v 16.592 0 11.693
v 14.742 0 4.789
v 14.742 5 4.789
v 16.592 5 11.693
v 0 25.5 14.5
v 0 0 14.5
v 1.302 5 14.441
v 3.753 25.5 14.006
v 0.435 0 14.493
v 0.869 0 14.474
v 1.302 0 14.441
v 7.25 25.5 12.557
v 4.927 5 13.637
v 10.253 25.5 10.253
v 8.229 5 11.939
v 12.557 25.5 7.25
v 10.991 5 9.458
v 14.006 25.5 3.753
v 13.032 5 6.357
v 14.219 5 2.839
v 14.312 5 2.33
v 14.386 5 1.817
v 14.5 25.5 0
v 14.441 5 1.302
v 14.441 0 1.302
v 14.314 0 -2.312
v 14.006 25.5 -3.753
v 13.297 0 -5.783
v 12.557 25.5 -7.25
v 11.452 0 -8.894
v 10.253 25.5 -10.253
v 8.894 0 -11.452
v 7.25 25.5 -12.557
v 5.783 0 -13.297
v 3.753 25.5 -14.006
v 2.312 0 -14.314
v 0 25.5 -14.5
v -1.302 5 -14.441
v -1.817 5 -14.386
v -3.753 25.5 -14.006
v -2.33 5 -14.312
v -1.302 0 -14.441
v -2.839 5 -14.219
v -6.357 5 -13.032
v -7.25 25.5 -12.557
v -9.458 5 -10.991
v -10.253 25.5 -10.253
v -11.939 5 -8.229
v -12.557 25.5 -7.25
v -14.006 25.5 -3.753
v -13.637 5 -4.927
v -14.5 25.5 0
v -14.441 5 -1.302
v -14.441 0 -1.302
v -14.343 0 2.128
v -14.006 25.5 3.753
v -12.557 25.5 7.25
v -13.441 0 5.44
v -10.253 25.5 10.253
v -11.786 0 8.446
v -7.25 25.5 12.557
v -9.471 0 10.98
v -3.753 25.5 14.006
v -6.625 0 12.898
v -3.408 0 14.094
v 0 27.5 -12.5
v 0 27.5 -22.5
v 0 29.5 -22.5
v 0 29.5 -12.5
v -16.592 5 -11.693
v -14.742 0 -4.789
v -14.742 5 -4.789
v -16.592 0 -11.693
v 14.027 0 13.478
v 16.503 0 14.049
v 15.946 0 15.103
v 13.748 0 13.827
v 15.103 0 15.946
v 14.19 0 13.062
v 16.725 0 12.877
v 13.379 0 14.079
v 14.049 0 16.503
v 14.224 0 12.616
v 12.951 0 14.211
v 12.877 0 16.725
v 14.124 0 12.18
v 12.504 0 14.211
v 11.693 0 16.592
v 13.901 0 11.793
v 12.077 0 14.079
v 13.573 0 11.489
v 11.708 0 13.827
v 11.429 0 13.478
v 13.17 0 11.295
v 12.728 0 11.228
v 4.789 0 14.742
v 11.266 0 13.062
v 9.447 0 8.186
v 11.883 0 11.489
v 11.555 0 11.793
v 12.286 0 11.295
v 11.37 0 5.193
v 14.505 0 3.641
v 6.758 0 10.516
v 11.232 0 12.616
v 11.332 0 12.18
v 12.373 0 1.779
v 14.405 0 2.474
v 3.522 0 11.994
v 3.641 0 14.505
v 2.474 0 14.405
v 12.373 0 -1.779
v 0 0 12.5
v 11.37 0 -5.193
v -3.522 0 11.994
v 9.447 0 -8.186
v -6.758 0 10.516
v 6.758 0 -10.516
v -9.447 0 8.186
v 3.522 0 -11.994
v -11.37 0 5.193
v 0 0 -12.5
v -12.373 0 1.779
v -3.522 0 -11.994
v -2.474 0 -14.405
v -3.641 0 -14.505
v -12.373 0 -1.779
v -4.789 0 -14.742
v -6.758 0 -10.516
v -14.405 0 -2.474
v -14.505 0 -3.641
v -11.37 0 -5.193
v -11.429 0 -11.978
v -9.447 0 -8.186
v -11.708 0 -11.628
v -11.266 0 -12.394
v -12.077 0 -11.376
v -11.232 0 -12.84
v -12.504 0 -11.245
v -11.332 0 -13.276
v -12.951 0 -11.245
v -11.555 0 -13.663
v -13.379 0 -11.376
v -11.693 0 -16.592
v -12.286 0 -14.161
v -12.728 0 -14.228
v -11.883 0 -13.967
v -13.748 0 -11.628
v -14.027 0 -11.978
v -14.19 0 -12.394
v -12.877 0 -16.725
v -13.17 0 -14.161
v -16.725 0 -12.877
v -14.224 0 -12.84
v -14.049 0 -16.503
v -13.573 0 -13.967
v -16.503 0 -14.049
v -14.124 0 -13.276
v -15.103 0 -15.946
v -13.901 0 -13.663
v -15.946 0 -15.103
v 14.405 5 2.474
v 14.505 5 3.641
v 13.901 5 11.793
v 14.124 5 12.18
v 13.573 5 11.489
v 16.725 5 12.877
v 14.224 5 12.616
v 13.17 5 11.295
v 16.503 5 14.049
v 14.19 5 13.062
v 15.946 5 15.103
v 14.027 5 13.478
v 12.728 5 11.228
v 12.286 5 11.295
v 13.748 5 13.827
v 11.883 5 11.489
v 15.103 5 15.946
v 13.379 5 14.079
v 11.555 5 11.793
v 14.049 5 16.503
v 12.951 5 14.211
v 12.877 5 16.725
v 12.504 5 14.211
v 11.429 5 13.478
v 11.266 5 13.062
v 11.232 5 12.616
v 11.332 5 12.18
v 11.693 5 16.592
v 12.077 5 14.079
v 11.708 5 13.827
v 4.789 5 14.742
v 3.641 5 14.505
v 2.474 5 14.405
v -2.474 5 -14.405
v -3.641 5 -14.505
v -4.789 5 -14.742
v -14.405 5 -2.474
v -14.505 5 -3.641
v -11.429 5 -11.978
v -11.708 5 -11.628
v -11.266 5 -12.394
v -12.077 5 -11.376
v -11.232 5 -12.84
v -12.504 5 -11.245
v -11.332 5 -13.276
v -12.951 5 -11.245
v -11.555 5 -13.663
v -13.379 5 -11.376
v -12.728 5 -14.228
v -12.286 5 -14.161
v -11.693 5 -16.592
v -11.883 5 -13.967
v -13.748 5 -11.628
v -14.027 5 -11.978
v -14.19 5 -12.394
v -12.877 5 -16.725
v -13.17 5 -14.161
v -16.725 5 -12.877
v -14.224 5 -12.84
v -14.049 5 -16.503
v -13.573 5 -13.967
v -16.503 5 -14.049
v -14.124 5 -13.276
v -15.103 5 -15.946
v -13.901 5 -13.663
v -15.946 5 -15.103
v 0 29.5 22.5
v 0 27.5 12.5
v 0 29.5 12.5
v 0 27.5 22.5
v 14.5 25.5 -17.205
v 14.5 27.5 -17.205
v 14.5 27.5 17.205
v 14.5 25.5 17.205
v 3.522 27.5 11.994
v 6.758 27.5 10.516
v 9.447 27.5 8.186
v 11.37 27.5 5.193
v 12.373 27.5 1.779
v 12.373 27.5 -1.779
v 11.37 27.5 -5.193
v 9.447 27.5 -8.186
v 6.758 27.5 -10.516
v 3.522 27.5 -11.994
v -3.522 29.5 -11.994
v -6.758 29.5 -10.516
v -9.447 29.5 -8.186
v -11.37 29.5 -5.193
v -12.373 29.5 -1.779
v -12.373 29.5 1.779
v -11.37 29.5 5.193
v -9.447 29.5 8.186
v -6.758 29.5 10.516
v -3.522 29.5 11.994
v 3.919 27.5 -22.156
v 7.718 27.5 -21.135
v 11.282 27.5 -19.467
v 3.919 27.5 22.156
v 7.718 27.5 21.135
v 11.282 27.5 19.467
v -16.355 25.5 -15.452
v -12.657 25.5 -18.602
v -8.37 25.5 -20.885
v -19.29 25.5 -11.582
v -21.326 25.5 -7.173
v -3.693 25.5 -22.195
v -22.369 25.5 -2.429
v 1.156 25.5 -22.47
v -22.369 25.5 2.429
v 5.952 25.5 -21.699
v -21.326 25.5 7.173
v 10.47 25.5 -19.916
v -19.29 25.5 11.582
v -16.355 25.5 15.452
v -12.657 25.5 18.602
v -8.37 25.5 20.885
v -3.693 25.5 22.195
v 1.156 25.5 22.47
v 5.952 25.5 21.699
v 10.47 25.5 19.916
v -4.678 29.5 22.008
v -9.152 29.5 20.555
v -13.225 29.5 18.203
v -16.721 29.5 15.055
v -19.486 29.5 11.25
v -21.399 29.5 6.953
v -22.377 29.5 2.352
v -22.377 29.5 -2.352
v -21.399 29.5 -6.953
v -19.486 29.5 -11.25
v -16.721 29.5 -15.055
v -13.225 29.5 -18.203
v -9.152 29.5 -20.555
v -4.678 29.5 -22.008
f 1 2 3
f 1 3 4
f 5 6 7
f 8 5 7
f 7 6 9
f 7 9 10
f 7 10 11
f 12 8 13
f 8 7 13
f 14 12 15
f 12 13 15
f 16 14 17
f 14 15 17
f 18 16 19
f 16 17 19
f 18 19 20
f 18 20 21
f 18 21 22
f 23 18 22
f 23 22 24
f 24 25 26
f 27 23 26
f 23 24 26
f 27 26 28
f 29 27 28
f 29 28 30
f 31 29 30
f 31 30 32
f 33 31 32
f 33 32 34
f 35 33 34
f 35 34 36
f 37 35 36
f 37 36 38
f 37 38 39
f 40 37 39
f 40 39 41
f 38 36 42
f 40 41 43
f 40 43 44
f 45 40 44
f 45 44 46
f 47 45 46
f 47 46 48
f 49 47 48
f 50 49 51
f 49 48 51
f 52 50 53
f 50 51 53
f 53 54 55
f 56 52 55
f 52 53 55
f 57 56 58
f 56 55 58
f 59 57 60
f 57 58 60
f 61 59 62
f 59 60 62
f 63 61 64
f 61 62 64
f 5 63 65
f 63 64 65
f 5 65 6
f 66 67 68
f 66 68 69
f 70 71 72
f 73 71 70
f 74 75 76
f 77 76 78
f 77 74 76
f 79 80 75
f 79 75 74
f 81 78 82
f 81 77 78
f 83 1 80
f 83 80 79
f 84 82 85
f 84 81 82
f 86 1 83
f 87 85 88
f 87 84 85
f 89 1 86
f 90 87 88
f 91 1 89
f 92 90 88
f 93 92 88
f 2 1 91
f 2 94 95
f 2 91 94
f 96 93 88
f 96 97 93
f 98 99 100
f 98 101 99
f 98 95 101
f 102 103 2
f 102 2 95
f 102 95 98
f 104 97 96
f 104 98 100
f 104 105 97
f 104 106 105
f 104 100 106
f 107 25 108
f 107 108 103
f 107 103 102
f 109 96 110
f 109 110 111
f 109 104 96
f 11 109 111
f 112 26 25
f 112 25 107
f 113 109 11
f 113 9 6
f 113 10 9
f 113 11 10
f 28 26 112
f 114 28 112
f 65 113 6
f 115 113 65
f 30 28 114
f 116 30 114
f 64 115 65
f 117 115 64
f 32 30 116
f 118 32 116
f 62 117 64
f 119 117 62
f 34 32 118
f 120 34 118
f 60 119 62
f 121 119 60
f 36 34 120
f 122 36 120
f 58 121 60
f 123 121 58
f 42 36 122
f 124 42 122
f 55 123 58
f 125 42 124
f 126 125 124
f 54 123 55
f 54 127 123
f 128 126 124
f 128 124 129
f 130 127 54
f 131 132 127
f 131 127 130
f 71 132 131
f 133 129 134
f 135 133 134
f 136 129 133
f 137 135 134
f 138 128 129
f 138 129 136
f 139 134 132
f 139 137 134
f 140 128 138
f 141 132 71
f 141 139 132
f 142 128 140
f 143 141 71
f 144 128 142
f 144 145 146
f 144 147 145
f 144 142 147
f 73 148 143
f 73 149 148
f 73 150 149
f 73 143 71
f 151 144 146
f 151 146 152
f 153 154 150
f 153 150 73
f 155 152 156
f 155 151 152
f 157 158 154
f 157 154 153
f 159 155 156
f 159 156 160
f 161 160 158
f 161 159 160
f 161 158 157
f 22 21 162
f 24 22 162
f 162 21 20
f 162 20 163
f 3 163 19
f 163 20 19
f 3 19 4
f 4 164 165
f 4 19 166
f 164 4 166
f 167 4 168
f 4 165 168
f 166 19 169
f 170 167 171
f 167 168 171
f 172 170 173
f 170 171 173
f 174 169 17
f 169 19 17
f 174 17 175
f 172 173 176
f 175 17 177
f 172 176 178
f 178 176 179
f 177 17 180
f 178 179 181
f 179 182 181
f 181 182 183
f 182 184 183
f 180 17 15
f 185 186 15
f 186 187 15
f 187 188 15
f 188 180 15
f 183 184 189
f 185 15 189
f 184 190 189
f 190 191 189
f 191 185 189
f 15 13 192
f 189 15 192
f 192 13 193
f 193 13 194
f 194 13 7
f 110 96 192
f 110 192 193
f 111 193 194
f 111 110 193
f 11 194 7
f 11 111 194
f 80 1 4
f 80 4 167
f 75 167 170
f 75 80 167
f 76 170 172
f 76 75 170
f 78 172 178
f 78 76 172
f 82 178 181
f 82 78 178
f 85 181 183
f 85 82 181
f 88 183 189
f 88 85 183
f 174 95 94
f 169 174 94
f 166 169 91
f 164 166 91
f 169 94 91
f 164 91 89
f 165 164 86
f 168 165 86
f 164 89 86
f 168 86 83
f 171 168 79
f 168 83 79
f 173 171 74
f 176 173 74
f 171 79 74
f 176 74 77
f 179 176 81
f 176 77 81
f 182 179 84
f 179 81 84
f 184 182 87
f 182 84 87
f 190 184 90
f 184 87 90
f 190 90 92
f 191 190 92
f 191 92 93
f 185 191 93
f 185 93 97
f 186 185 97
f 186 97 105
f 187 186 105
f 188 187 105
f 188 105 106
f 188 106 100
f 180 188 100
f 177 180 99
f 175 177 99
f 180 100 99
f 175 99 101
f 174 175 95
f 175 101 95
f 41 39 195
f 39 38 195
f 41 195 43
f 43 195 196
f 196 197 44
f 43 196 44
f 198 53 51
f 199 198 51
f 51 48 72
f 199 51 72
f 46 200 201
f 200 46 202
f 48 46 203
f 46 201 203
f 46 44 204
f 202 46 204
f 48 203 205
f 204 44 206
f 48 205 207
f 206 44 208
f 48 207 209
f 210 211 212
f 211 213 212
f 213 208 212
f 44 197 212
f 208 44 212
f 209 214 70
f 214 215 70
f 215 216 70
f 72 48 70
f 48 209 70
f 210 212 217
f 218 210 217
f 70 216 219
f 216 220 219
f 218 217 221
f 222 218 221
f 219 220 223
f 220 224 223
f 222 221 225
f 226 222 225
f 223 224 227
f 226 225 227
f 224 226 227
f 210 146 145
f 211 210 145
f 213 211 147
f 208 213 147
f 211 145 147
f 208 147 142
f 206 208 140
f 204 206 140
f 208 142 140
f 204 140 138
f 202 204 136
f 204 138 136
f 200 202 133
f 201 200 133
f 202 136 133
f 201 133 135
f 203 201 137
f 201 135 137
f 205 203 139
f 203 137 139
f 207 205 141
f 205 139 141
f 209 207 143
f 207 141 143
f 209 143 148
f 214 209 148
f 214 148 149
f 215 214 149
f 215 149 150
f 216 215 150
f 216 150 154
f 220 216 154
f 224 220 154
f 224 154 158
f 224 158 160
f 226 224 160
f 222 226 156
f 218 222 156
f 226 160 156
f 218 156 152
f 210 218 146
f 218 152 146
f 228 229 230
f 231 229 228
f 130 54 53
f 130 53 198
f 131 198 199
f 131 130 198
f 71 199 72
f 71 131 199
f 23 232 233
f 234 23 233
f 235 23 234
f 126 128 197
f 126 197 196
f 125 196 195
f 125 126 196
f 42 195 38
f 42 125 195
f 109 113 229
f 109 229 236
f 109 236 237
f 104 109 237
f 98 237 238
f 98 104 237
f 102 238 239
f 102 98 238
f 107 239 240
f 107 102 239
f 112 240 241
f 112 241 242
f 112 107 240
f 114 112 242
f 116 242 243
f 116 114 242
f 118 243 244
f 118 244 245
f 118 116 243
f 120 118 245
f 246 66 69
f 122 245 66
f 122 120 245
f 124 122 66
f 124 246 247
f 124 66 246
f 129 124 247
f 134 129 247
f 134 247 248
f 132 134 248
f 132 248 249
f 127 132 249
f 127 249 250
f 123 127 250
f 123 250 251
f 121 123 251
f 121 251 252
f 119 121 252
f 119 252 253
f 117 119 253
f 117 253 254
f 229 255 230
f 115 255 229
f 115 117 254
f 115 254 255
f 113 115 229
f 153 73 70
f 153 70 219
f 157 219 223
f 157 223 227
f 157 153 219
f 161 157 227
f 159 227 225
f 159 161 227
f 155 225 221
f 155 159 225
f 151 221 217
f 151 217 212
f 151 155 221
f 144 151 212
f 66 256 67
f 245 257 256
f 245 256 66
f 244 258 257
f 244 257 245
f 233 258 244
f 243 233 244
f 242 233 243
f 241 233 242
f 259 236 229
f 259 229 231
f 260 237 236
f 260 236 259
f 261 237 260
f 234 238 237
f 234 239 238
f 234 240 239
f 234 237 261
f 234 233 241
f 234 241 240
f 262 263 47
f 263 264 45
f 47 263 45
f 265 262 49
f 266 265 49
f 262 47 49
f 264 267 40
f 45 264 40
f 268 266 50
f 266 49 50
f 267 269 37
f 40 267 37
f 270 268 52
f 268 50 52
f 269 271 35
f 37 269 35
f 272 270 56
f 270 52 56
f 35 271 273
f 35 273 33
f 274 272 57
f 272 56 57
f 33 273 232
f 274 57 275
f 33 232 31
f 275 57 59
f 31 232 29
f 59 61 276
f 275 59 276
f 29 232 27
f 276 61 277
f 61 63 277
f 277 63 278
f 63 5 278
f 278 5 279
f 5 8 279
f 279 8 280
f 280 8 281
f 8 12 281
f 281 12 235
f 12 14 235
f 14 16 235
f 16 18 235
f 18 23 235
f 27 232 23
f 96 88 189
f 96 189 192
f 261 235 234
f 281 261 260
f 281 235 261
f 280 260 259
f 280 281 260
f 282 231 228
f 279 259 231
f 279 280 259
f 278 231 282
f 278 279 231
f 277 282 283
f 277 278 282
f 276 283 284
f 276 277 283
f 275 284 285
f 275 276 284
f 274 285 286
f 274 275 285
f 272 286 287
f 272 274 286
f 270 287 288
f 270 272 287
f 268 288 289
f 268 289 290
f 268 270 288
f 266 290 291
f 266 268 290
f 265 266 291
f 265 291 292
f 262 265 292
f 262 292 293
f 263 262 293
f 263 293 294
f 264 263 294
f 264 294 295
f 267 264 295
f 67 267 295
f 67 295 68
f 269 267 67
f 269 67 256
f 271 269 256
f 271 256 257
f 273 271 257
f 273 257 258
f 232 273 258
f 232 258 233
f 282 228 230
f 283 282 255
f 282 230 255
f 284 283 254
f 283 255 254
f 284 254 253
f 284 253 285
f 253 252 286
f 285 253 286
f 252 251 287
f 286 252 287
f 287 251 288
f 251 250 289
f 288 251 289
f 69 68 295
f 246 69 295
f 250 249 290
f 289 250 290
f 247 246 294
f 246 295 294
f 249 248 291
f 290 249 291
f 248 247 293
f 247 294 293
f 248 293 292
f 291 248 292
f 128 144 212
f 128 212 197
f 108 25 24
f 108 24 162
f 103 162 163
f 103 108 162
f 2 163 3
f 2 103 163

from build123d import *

# Parameters (mm, degrees)
SKETCH_2_R          = 14.5
SKETCH_2_R_2        = 12.5
EXTRUDE_1_DEPTH     = 25.5
SKETCH_3_R          = 22.5
SKETCH_3_R_2        = 12.5
EXTRUDE_2_DEPTH     = 2
EXTRUDE_3_DEPTH     = 2
CUT_EXTRUDE_1_DEPTH = 10
SKETCH_7_R          = 1.500000000000006
SKETCH_7_R_2        = 14.5
SKETCH_7_R_3        = 12.5
SKETCH_7_R_4        = 1.499999999999986
EXTRUDE_4_DEPTH     = 5
FILLET_1_R          = 10


with BuildPart() as part:
    # 草圖2 → 填料-伸長1 (new body)
    with BuildSketch(Plane(origin=(0, 0, 0), x_dir=(1, 0, 0), z_dir=(0, 1, 0))):
        with Locations(Location((0, 0, 0), (0, 0, 270))):
            Circle(SKETCH_2_R)
        with Locations(Location((0, 0, 0), (0, 0, 270))):
            Circle(SKETCH_2_R_2, mode=Mode.SUBTRACT)
    extrude(amount=EXTRUDE_1_DEPTH)

    # 草圖3 → 填料-伸長2 (add)
    with BuildSketch(Plane(origin=(0, 25.5, 0), x_dir=(1, 0, 0), z_dir=(0, 1, 0))):
        with Locations(Location((0, 0, 0), (0, 0, 270))):
            Circle(SKETCH_3_R)
        with Locations(Location((0, 0, 0), (0, 0, 270))):
            Circle(SKETCH_3_R_2, mode=Mode.SUBTRACT)
    extrude(amount=EXTRUDE_2_DEPTH)

    # 草圖4 → 填料-伸長3 (add)
    with BuildSketch(Plane(origin=(0, 27.499999999999996, 0), x_dir=(1, 0, 0), z_dir=(0, 1, 0))):
        with BuildLine():
            Line((0, 22.500000000000004), (4.29e-15, 12.5))
            ThreePointArc((4.29e-15, 12.5), (-12.5, 1.53e-15), (4.29e-15, -12.5))
            Line((4.29e-15, -12.5), (0, -22.500000000000004))
            ThreePointArc((0, -22.500000000000004), (-22.500000000000004, 2.76e-15), (0, 22.500000000000004))
        make_face()
    extrude(amount=EXTRUDE_3_DEPTH)

    # 草圖6 → 除料-伸長1 (cut)
    with BuildSketch(Plane.XZ.offset(-25.5)):
        Polygon((14.499999999999996, 29.395789513712703), (53.33899904059902, 29.395789513712703), (53.33899904059903, -31.21012107711215), (14.500000000000004, -31.21012107711215), align=None)
    extrude(amount=-CUT_EXTRUDE_1_DEPTH, mode=Mode.SUBTRACT)

    # 草圖7 → 填料-伸長4 (add)
    # profile 1 of 3: a face of its own
    with BuildSketch(Plane.XZ):
        with BuildLine():
            ThreePointArc((-16.59162536651419, -11.692645880947747), (-15.556349186104121, -15.556349186104029), (-11.692645880947847, -16.591625366514123))
            Line((-11.692645880947847, -16.591625366514123), (-2.839123359878414, -14.21933115682284))
            ThreePointArc((-2.8391233598784202, -14.219331156822836), (-10.253048327204969, -10.25304832720491), (-14.219331156822854, -2.8391233598783336))
            Line((-14.219331156822806, -2.8391233598783234), (-16.59162536651419, -11.692645880947747))
        make_face()
        with Locations(Location((-12.727922061357921, -12.72792206135785, 0), (0, 0, 270))):
            Circle(SKETCH_7_R, mode=Mode.SUBTRACT)
    # profile 2 of 3: a face of its own
    with BuildSketch(Plane.XZ):
        with Locations(Location((0, 0, 0), (0, 0, 258.708444725))):
            Circle(SKETCH_7_R_2)
        with Locations(Location((0, 0, 0), (0, 0, 90))):
            Circle(SKETCH_7_R_3, mode=Mode.SUBTRACT)
    # profile 3 of 3: a face of its own
    with BuildSketch(Plane.XZ):
        with BuildLine():
            Line((11.692645880947822, 16.591625366514), (2.839123359878405, 14.21933115682271))
            ThreePointArc((2.8391233598784344, 14.219331156822834), (10.253048327205017, 10.25304832720486), (14.219331156822877, 2.8391233598782186))
            Line((14.219331156822797, 2.8391233598782026), (16.591625366514172, 11.692645880947598))
            ThreePointArc((16.591625366514172, 11.692645880947598), (15.556349186104118, 15.556349186103905), (11.692645880947822, 16.591625366514))
        make_face()
        with Locations(Location((12.727922061357914, 12.72792206135772, 0), (0, 0, 270))):
            Circle(SKETCH_7_R_4, mode=Mode.SUBTRACT)
    extrude(amount=-EXTRUDE_4_DEPTH)

    # 圓角1
    # the kernel refuses this fillet: 10 mm, written as the material it adds along each edge
    with BuildSketch(Plane(origin=(-14.21933115682283, 0, -2.8391233598783296), x_dir=(-0.14301440720376446, 0, 0.9897206067027986), z_dir=(0, 1, 0))) as fillet_1_piece_1:
        with BuildLine():
            CenterArc((2.0881667201812895, -9.98565558877935), FILLET_1_R, 93.06924050881132, 20.153074257108685)
            Line((-1.8548317977652202, -0.7958371636160083), (0, 0))
            ThreePointArc((0, 0), (0.7763696780160548, -0.02079939626993994), (1.5527393560321237, -3e-17))
        make_face()
    extrude(amount=5)
    with BuildSketch(Plane(origin=(2.83912335987842, 0, 14.219331156822772), x_dir=(-0.9897206067027934, 0, 0.1430144072038011), z_dir=(0, 1, 0))) as fillet_1_piece_2:
        with BuildLine():
            CenterArc((2.0881667201813614, 9.98565558877934), FILLET_1_R, 246.7776852340785, 20.153074257108983)
            Line((-1.854831797765394, 0.7958371636161028), (0, 0))
            ThreePointArc((0, 0), (0.7763696780159942, 0.02079939626995778), (1.552739356031987, -2e-17))
        make_face()
    extrude(amount=5)
    with BuildSketch(Plane(origin=(14.219331156822836, 0, 2.839123359878211), x_dir=(0.14301440720376882, 0, -0.989720606702798), z_dir=(0, 1, 0))) as fillet_1_piece_3:
        with BuildLine():
            CenterArc((2.088166720181273, -9.985655588779348), FILLET_1_R, 93.06924050881172, 20.1530742571085)
            Line((-1.8548317977652724, -0.795837163616021), (0, 0))
            ThreePointArc((0, 0), (0.7763696780160197, -0.02079939626995059), (1.5527393560320395, 2e-17))
        make_face()
    extrude(amount=5)
    with BuildSketch(Plane(origin=(-2.8391233598784176, 0, -14.21933115682284), x_dir=(0.9897206067028005, 0, -0.1430144072037512), z_dir=(0, 1, 0))) as fillet_1_piece_4:
        with BuildLine():
            CenterArc((2.088166720181194, 9.985655588779359), FILLET_1_R, 246.7776852340814, 20.153074257108187)
            Line((-1.8548317977650892, 0.7958371636159217), (0, 0))
            ThreePointArc((0, 0), (0.7763696780160907, 0.02079939626993076), (1.552739356032181, -2e-17))
        make_face()
    extrude(amount=5)


solid = part.part
